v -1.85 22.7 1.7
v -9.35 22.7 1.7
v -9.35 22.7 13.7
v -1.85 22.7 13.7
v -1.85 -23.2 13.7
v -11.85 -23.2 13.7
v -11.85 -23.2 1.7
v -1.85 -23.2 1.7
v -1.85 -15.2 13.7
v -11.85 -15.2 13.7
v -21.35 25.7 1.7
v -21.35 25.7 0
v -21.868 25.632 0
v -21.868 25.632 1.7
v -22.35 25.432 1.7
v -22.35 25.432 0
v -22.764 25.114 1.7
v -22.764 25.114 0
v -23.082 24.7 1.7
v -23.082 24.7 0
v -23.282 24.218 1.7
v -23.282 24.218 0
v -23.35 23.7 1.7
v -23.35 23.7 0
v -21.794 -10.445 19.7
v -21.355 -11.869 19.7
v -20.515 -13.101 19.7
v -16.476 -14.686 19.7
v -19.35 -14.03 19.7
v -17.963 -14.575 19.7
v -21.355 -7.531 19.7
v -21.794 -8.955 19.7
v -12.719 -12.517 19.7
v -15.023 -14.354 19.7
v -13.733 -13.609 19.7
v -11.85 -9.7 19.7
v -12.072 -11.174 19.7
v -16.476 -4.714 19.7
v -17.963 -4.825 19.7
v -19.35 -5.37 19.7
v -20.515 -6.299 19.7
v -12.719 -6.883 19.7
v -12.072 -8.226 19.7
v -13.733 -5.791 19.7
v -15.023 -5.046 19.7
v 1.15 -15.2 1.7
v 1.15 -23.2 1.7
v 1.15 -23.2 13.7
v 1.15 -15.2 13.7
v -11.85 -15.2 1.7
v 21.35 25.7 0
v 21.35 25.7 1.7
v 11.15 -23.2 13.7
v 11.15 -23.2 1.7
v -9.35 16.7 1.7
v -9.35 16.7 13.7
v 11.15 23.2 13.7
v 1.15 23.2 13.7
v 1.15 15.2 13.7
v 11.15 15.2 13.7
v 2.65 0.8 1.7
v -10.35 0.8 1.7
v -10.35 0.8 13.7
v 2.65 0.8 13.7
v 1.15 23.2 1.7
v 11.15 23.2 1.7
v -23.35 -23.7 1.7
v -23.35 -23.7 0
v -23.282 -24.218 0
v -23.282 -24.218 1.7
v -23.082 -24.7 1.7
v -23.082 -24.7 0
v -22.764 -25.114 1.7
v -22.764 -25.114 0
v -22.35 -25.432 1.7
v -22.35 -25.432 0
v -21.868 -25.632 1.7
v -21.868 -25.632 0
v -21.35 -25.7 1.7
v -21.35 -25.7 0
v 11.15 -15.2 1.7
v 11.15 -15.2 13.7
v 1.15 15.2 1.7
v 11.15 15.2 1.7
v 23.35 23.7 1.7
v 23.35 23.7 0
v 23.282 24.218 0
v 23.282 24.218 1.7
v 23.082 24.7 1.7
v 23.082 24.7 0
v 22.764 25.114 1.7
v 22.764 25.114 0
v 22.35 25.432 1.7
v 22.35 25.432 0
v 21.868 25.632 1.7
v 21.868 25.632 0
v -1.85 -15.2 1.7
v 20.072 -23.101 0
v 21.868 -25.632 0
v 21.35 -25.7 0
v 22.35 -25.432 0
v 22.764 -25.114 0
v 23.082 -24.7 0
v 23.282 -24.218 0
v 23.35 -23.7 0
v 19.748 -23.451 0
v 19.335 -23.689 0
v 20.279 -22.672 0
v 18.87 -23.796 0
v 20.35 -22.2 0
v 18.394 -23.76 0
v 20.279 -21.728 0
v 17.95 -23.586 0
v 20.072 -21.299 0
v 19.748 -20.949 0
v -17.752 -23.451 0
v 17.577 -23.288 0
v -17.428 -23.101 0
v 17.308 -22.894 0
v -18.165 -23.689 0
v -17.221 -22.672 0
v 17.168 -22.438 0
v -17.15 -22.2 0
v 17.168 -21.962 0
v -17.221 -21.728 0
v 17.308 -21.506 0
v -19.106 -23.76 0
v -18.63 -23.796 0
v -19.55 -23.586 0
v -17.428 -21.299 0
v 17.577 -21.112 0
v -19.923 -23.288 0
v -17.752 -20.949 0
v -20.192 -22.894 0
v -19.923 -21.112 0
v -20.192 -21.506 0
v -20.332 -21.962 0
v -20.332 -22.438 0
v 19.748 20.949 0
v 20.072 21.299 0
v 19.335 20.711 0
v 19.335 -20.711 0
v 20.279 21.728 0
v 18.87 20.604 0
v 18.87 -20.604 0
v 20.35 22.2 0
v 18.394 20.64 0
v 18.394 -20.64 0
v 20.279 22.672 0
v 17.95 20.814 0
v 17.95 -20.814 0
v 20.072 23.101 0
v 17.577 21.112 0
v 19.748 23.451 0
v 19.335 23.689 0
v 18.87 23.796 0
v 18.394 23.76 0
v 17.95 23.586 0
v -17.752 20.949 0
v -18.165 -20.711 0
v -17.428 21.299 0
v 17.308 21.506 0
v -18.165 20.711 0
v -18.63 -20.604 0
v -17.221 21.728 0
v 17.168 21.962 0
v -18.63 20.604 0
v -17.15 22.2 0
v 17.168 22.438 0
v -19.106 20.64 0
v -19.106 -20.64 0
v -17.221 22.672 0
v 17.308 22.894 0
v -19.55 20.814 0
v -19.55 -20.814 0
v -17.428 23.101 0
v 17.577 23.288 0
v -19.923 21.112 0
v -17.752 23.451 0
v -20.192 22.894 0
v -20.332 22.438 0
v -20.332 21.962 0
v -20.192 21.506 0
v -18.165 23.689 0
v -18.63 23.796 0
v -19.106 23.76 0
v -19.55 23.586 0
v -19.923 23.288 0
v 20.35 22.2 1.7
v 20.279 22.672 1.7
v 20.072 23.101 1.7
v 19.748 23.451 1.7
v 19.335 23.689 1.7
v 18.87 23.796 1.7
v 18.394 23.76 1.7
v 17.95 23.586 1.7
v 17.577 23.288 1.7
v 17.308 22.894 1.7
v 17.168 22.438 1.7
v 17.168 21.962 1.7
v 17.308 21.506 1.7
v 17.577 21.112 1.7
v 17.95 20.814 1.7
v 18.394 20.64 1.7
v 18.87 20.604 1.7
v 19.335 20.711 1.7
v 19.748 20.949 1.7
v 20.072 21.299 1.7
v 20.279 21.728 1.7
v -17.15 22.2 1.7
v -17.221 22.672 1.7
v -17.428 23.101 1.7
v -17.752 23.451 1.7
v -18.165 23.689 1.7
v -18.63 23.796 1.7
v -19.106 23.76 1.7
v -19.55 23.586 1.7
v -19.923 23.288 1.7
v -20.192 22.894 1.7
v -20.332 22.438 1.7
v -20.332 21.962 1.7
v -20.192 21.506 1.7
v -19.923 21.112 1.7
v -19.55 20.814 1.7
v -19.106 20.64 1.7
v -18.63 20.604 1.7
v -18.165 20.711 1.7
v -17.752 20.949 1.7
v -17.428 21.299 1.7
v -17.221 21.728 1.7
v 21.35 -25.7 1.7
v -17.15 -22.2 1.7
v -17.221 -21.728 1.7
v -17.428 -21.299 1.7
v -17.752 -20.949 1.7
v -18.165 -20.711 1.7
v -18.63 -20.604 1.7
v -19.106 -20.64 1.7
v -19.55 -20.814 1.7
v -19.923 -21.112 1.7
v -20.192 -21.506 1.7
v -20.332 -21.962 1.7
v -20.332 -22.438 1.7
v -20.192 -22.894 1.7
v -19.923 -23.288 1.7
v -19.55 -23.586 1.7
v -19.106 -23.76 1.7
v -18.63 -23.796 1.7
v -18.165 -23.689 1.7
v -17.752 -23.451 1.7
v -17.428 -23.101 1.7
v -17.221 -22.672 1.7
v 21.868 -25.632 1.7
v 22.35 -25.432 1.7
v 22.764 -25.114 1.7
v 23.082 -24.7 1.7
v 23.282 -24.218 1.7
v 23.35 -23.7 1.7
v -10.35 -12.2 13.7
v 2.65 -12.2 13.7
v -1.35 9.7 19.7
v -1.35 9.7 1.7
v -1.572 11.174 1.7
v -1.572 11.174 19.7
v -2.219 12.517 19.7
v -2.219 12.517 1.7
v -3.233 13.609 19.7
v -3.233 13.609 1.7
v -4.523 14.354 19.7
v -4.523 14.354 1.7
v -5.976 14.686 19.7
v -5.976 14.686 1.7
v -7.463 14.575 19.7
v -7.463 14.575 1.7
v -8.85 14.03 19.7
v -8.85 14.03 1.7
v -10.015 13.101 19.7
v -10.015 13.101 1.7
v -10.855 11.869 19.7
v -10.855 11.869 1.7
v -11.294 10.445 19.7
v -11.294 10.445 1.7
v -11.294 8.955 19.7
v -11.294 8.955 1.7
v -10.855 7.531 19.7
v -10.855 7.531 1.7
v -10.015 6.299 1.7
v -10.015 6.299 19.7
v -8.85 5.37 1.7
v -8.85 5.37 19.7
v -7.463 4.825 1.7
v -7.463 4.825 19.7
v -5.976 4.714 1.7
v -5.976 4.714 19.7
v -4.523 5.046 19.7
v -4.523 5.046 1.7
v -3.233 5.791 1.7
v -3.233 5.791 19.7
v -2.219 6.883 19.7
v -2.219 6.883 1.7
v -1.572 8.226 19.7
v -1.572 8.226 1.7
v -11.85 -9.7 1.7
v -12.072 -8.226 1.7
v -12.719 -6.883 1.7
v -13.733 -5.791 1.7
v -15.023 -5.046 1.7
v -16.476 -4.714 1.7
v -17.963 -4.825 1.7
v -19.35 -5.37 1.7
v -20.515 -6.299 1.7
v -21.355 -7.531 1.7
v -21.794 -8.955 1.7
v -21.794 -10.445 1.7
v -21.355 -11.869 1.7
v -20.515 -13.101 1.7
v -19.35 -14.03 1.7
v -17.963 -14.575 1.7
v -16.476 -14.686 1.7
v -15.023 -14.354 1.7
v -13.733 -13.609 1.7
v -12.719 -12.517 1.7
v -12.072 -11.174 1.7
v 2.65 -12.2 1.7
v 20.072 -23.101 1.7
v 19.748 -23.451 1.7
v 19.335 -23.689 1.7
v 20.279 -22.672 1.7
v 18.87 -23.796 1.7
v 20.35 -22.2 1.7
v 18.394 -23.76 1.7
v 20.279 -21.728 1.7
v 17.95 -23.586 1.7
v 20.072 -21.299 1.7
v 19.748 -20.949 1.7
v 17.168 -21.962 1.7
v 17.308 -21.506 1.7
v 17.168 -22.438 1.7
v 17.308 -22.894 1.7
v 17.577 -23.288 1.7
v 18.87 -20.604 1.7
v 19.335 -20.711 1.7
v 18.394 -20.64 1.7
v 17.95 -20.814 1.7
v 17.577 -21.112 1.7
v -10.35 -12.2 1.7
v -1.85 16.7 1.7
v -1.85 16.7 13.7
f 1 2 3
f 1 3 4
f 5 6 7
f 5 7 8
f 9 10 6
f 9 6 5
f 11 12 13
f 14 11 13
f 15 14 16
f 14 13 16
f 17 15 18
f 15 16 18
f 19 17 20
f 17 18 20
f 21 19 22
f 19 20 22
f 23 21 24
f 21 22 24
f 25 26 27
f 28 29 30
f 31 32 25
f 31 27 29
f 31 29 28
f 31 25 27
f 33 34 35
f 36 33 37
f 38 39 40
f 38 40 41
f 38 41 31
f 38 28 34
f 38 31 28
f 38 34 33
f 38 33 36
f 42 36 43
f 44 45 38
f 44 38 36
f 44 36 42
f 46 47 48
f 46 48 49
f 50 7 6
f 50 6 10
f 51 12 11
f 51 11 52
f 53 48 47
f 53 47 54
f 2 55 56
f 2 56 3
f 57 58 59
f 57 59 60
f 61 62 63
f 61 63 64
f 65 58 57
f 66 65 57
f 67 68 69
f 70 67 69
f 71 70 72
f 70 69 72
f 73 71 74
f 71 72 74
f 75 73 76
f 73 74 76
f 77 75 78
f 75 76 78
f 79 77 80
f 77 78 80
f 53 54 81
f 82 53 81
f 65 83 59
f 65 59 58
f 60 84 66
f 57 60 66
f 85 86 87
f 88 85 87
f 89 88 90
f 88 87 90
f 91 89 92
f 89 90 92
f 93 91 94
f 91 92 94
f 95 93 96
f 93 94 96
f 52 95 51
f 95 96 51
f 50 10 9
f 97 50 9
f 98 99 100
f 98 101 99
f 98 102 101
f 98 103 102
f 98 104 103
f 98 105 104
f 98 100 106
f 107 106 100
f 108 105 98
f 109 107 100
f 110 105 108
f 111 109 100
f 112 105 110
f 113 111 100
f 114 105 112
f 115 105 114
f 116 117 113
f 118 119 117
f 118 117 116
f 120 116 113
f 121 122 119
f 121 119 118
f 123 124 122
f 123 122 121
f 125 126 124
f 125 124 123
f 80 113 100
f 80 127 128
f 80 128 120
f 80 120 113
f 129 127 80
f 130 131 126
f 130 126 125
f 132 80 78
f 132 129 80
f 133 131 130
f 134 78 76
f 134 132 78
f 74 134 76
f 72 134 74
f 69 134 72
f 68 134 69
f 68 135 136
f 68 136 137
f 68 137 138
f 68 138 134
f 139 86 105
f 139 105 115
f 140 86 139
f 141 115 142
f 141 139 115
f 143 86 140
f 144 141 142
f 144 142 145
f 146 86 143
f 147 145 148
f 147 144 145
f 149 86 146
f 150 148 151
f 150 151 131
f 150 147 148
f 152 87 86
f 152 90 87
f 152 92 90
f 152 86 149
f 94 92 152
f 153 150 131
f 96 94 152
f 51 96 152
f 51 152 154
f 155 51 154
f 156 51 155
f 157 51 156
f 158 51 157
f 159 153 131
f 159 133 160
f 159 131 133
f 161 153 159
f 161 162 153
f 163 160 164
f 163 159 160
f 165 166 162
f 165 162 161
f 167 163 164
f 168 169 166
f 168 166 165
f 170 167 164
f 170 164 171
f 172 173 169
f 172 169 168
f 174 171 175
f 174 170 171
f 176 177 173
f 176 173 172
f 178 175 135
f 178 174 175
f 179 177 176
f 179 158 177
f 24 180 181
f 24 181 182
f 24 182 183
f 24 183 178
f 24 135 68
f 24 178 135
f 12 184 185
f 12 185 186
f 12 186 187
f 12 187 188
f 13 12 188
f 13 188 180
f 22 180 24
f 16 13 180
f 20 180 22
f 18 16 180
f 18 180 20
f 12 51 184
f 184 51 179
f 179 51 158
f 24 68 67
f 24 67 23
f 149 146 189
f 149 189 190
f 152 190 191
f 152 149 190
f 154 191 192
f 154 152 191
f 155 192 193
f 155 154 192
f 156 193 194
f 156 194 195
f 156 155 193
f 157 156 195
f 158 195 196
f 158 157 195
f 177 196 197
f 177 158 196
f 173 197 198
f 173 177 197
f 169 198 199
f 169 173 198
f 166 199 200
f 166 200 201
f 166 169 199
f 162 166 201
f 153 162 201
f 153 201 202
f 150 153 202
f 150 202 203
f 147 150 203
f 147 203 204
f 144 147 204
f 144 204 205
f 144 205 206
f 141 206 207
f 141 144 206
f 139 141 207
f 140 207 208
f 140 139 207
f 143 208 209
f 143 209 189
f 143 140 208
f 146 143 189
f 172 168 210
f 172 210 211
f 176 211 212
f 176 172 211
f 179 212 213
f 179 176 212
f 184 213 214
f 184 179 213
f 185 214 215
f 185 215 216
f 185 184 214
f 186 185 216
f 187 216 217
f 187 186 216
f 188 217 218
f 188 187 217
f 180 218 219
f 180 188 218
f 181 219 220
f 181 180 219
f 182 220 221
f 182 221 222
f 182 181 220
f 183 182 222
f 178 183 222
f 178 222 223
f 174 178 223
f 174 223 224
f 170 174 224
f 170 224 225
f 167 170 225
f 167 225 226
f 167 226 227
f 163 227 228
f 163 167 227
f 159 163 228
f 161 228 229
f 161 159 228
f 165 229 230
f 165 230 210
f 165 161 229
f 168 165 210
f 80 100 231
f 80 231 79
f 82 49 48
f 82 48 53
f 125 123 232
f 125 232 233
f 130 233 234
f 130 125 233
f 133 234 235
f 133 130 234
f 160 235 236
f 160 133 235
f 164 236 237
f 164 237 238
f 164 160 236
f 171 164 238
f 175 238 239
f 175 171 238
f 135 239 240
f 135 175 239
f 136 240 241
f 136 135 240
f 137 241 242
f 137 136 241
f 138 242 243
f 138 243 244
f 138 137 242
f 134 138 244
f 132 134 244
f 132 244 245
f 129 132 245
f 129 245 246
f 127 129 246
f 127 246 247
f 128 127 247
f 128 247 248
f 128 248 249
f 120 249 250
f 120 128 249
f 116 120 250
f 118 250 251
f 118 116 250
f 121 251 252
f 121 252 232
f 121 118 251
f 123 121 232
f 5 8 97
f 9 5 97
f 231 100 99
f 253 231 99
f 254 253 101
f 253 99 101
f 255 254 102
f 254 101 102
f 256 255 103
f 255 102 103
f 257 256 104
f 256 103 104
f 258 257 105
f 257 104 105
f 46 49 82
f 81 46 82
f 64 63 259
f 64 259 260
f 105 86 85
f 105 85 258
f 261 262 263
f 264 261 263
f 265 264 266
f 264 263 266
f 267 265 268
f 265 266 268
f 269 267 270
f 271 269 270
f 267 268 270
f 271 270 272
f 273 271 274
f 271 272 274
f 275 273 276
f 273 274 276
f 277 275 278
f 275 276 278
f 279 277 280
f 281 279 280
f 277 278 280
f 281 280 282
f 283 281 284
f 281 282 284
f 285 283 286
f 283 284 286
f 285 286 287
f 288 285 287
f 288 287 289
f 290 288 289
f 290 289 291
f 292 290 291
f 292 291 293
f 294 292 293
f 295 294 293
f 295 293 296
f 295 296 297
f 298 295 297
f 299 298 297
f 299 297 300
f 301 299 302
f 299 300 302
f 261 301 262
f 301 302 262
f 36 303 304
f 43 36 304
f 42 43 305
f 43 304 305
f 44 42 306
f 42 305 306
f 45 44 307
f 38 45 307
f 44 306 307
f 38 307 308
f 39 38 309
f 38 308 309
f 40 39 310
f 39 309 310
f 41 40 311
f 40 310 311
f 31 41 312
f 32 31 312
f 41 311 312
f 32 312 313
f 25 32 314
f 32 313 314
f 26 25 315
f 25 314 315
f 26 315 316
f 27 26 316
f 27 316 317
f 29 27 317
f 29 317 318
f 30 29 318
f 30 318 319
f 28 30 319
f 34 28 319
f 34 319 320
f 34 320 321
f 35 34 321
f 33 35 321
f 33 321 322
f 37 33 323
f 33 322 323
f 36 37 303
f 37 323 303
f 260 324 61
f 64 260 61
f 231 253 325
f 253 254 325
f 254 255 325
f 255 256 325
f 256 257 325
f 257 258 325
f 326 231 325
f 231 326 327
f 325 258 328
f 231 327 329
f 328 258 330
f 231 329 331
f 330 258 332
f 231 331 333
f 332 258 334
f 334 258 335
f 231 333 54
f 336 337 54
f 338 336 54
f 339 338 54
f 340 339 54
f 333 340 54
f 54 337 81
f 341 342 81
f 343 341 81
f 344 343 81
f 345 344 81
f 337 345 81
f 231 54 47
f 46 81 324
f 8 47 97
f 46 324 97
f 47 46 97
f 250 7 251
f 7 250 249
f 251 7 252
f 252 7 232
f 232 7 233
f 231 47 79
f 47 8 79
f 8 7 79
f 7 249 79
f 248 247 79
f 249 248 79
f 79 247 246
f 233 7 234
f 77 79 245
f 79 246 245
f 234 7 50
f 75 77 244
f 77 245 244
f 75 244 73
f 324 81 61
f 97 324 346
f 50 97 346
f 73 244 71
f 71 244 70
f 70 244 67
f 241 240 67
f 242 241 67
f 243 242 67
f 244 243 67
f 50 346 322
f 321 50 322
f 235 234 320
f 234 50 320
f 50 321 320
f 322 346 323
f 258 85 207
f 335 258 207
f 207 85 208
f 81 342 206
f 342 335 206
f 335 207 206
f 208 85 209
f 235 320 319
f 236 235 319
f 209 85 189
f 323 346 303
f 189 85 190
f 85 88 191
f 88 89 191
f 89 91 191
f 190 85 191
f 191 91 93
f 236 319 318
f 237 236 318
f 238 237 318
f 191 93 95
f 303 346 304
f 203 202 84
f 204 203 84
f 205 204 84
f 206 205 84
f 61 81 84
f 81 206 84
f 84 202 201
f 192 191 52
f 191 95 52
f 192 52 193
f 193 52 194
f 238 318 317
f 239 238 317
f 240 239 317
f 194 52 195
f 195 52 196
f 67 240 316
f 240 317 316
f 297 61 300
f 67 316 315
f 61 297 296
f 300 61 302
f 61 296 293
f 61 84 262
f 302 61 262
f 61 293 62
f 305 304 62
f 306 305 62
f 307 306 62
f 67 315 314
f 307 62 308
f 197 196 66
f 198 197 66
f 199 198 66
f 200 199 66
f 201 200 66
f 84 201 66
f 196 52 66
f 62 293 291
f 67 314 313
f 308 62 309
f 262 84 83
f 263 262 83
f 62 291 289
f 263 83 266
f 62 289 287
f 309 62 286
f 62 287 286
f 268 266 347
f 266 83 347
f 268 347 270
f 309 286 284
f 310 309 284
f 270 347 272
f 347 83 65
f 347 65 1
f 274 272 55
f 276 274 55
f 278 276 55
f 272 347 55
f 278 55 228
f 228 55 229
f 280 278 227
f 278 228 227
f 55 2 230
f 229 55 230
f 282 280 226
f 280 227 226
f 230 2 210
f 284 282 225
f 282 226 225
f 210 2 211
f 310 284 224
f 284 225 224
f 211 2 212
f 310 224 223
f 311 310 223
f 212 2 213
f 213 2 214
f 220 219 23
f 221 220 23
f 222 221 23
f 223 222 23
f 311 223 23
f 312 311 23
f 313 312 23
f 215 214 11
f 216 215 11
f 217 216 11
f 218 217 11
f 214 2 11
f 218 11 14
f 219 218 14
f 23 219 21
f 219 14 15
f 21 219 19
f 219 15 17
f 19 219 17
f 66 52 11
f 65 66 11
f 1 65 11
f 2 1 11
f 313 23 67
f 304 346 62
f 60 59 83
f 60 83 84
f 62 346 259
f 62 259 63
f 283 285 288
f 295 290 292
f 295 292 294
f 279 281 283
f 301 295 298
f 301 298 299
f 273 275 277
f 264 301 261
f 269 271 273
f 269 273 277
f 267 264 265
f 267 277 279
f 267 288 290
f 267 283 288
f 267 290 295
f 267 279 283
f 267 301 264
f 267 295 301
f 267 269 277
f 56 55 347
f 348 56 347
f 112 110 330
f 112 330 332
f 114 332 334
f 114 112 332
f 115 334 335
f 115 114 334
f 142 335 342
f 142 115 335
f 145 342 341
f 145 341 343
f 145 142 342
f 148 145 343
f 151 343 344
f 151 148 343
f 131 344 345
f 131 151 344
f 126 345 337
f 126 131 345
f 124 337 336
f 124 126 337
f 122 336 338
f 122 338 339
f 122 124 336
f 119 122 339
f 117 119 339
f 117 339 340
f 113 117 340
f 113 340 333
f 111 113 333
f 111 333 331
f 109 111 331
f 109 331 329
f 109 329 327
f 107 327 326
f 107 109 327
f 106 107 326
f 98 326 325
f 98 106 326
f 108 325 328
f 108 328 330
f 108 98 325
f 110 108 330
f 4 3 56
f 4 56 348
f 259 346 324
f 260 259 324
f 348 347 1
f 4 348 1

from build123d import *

# Parameters (mm, degrees)
SKETCH_R      = 1.6
PAD_DEPTH     = 1.7
SKETCH001_W   = 10
SKETCH001_H   = 8
SKETCH001_W_2 = 7.5
SKETCH001_H_2 = 6
SKETCH001_W_3 = 13
SKETCH001_H_3 = 13
PAD001_DEPTH  = 12
SKETCH002_R   = 5
PAD002_DEPTH  = 18


with BuildPart() as part:
    # Sketch → Pad (new body)
    with BuildSketch(Plane.XY):
        with BuildLine():
            Line((-21.35, 25.7), (21.35, 25.7))
            ThreePointArc((23.35, 23.7), (22.764214, 25.114214), (21.35, 25.7))
            Line((23.35, 23.7), (23.35, -23.7))
            ThreePointArc((21.35, -25.7), (22.764214, -25.114214), (23.35, -23.7))
            Line((21.35, -25.7), (-21.35, -25.7))
            ThreePointArc((-23.35, -23.7), (-22.764214, -25.114214), (-21.35, -25.7))
            Line((-23.35, -23.7), (-23.35, 23.7))
            ThreePointArc((-21.35, 25.7), (-22.764214, 25.114214), (-23.35, 23.7))
        make_face()
        with Locations((-18.75, -22.2)):
            Circle(SKETCH_R, mode=Mode.SUBTRACT)
        with Locations((18.75, -22.2)):
            Circle(SKETCH_R, mode=Mode.SUBTRACT)
        with Locations((18.75, 22.2)):
            Circle(SKETCH_R, mode=Mode.SUBTRACT)
        with Locations((-18.75, 22.2)):
            Circle(SKETCH_R, mode=Mode.SUBTRACT)
    extrude(amount=PAD_DEPTH)

    # Sketch001 (on Face14 of Pad) → Pad001 (join)
    with BuildSketch(Plane.XY.offset(1.7)):
        with Locations((-6.85, -19.2)):
            Rectangle(SKETCH001_W, SKETCH001_H)
        with Locations((6.15, -19.2)):
            Rectangle(SKETCH001_W, SKETCH001_H)
        with Locations((6.15, 19.2)):
            Rectangle(SKETCH001_W, SKETCH001_H)
        with Locations((-5.6, 19.7)):
            Rectangle(SKETCH001_W_2, SKETCH001_H_2)
        with Locations((-3.85, -5.7)):
            Rectangle(SKETCH001_W_3, SKETCH001_H_3)
    extrude(amount=PAD001_DEPTH)

    # Sketch002 (on Face5 of Pad001) → Pad002 (join)
    with BuildSketch(Plane.XY.offset(1.7)):
        with Locations((-16.85, -9.7)):
            Circle(SKETCH002_R)
        with Locations((-6.35, 9.7)):
            Circle(SKETCH002_R)
    extrude(amount=PAD002_DEPTH)


solid = part.part
